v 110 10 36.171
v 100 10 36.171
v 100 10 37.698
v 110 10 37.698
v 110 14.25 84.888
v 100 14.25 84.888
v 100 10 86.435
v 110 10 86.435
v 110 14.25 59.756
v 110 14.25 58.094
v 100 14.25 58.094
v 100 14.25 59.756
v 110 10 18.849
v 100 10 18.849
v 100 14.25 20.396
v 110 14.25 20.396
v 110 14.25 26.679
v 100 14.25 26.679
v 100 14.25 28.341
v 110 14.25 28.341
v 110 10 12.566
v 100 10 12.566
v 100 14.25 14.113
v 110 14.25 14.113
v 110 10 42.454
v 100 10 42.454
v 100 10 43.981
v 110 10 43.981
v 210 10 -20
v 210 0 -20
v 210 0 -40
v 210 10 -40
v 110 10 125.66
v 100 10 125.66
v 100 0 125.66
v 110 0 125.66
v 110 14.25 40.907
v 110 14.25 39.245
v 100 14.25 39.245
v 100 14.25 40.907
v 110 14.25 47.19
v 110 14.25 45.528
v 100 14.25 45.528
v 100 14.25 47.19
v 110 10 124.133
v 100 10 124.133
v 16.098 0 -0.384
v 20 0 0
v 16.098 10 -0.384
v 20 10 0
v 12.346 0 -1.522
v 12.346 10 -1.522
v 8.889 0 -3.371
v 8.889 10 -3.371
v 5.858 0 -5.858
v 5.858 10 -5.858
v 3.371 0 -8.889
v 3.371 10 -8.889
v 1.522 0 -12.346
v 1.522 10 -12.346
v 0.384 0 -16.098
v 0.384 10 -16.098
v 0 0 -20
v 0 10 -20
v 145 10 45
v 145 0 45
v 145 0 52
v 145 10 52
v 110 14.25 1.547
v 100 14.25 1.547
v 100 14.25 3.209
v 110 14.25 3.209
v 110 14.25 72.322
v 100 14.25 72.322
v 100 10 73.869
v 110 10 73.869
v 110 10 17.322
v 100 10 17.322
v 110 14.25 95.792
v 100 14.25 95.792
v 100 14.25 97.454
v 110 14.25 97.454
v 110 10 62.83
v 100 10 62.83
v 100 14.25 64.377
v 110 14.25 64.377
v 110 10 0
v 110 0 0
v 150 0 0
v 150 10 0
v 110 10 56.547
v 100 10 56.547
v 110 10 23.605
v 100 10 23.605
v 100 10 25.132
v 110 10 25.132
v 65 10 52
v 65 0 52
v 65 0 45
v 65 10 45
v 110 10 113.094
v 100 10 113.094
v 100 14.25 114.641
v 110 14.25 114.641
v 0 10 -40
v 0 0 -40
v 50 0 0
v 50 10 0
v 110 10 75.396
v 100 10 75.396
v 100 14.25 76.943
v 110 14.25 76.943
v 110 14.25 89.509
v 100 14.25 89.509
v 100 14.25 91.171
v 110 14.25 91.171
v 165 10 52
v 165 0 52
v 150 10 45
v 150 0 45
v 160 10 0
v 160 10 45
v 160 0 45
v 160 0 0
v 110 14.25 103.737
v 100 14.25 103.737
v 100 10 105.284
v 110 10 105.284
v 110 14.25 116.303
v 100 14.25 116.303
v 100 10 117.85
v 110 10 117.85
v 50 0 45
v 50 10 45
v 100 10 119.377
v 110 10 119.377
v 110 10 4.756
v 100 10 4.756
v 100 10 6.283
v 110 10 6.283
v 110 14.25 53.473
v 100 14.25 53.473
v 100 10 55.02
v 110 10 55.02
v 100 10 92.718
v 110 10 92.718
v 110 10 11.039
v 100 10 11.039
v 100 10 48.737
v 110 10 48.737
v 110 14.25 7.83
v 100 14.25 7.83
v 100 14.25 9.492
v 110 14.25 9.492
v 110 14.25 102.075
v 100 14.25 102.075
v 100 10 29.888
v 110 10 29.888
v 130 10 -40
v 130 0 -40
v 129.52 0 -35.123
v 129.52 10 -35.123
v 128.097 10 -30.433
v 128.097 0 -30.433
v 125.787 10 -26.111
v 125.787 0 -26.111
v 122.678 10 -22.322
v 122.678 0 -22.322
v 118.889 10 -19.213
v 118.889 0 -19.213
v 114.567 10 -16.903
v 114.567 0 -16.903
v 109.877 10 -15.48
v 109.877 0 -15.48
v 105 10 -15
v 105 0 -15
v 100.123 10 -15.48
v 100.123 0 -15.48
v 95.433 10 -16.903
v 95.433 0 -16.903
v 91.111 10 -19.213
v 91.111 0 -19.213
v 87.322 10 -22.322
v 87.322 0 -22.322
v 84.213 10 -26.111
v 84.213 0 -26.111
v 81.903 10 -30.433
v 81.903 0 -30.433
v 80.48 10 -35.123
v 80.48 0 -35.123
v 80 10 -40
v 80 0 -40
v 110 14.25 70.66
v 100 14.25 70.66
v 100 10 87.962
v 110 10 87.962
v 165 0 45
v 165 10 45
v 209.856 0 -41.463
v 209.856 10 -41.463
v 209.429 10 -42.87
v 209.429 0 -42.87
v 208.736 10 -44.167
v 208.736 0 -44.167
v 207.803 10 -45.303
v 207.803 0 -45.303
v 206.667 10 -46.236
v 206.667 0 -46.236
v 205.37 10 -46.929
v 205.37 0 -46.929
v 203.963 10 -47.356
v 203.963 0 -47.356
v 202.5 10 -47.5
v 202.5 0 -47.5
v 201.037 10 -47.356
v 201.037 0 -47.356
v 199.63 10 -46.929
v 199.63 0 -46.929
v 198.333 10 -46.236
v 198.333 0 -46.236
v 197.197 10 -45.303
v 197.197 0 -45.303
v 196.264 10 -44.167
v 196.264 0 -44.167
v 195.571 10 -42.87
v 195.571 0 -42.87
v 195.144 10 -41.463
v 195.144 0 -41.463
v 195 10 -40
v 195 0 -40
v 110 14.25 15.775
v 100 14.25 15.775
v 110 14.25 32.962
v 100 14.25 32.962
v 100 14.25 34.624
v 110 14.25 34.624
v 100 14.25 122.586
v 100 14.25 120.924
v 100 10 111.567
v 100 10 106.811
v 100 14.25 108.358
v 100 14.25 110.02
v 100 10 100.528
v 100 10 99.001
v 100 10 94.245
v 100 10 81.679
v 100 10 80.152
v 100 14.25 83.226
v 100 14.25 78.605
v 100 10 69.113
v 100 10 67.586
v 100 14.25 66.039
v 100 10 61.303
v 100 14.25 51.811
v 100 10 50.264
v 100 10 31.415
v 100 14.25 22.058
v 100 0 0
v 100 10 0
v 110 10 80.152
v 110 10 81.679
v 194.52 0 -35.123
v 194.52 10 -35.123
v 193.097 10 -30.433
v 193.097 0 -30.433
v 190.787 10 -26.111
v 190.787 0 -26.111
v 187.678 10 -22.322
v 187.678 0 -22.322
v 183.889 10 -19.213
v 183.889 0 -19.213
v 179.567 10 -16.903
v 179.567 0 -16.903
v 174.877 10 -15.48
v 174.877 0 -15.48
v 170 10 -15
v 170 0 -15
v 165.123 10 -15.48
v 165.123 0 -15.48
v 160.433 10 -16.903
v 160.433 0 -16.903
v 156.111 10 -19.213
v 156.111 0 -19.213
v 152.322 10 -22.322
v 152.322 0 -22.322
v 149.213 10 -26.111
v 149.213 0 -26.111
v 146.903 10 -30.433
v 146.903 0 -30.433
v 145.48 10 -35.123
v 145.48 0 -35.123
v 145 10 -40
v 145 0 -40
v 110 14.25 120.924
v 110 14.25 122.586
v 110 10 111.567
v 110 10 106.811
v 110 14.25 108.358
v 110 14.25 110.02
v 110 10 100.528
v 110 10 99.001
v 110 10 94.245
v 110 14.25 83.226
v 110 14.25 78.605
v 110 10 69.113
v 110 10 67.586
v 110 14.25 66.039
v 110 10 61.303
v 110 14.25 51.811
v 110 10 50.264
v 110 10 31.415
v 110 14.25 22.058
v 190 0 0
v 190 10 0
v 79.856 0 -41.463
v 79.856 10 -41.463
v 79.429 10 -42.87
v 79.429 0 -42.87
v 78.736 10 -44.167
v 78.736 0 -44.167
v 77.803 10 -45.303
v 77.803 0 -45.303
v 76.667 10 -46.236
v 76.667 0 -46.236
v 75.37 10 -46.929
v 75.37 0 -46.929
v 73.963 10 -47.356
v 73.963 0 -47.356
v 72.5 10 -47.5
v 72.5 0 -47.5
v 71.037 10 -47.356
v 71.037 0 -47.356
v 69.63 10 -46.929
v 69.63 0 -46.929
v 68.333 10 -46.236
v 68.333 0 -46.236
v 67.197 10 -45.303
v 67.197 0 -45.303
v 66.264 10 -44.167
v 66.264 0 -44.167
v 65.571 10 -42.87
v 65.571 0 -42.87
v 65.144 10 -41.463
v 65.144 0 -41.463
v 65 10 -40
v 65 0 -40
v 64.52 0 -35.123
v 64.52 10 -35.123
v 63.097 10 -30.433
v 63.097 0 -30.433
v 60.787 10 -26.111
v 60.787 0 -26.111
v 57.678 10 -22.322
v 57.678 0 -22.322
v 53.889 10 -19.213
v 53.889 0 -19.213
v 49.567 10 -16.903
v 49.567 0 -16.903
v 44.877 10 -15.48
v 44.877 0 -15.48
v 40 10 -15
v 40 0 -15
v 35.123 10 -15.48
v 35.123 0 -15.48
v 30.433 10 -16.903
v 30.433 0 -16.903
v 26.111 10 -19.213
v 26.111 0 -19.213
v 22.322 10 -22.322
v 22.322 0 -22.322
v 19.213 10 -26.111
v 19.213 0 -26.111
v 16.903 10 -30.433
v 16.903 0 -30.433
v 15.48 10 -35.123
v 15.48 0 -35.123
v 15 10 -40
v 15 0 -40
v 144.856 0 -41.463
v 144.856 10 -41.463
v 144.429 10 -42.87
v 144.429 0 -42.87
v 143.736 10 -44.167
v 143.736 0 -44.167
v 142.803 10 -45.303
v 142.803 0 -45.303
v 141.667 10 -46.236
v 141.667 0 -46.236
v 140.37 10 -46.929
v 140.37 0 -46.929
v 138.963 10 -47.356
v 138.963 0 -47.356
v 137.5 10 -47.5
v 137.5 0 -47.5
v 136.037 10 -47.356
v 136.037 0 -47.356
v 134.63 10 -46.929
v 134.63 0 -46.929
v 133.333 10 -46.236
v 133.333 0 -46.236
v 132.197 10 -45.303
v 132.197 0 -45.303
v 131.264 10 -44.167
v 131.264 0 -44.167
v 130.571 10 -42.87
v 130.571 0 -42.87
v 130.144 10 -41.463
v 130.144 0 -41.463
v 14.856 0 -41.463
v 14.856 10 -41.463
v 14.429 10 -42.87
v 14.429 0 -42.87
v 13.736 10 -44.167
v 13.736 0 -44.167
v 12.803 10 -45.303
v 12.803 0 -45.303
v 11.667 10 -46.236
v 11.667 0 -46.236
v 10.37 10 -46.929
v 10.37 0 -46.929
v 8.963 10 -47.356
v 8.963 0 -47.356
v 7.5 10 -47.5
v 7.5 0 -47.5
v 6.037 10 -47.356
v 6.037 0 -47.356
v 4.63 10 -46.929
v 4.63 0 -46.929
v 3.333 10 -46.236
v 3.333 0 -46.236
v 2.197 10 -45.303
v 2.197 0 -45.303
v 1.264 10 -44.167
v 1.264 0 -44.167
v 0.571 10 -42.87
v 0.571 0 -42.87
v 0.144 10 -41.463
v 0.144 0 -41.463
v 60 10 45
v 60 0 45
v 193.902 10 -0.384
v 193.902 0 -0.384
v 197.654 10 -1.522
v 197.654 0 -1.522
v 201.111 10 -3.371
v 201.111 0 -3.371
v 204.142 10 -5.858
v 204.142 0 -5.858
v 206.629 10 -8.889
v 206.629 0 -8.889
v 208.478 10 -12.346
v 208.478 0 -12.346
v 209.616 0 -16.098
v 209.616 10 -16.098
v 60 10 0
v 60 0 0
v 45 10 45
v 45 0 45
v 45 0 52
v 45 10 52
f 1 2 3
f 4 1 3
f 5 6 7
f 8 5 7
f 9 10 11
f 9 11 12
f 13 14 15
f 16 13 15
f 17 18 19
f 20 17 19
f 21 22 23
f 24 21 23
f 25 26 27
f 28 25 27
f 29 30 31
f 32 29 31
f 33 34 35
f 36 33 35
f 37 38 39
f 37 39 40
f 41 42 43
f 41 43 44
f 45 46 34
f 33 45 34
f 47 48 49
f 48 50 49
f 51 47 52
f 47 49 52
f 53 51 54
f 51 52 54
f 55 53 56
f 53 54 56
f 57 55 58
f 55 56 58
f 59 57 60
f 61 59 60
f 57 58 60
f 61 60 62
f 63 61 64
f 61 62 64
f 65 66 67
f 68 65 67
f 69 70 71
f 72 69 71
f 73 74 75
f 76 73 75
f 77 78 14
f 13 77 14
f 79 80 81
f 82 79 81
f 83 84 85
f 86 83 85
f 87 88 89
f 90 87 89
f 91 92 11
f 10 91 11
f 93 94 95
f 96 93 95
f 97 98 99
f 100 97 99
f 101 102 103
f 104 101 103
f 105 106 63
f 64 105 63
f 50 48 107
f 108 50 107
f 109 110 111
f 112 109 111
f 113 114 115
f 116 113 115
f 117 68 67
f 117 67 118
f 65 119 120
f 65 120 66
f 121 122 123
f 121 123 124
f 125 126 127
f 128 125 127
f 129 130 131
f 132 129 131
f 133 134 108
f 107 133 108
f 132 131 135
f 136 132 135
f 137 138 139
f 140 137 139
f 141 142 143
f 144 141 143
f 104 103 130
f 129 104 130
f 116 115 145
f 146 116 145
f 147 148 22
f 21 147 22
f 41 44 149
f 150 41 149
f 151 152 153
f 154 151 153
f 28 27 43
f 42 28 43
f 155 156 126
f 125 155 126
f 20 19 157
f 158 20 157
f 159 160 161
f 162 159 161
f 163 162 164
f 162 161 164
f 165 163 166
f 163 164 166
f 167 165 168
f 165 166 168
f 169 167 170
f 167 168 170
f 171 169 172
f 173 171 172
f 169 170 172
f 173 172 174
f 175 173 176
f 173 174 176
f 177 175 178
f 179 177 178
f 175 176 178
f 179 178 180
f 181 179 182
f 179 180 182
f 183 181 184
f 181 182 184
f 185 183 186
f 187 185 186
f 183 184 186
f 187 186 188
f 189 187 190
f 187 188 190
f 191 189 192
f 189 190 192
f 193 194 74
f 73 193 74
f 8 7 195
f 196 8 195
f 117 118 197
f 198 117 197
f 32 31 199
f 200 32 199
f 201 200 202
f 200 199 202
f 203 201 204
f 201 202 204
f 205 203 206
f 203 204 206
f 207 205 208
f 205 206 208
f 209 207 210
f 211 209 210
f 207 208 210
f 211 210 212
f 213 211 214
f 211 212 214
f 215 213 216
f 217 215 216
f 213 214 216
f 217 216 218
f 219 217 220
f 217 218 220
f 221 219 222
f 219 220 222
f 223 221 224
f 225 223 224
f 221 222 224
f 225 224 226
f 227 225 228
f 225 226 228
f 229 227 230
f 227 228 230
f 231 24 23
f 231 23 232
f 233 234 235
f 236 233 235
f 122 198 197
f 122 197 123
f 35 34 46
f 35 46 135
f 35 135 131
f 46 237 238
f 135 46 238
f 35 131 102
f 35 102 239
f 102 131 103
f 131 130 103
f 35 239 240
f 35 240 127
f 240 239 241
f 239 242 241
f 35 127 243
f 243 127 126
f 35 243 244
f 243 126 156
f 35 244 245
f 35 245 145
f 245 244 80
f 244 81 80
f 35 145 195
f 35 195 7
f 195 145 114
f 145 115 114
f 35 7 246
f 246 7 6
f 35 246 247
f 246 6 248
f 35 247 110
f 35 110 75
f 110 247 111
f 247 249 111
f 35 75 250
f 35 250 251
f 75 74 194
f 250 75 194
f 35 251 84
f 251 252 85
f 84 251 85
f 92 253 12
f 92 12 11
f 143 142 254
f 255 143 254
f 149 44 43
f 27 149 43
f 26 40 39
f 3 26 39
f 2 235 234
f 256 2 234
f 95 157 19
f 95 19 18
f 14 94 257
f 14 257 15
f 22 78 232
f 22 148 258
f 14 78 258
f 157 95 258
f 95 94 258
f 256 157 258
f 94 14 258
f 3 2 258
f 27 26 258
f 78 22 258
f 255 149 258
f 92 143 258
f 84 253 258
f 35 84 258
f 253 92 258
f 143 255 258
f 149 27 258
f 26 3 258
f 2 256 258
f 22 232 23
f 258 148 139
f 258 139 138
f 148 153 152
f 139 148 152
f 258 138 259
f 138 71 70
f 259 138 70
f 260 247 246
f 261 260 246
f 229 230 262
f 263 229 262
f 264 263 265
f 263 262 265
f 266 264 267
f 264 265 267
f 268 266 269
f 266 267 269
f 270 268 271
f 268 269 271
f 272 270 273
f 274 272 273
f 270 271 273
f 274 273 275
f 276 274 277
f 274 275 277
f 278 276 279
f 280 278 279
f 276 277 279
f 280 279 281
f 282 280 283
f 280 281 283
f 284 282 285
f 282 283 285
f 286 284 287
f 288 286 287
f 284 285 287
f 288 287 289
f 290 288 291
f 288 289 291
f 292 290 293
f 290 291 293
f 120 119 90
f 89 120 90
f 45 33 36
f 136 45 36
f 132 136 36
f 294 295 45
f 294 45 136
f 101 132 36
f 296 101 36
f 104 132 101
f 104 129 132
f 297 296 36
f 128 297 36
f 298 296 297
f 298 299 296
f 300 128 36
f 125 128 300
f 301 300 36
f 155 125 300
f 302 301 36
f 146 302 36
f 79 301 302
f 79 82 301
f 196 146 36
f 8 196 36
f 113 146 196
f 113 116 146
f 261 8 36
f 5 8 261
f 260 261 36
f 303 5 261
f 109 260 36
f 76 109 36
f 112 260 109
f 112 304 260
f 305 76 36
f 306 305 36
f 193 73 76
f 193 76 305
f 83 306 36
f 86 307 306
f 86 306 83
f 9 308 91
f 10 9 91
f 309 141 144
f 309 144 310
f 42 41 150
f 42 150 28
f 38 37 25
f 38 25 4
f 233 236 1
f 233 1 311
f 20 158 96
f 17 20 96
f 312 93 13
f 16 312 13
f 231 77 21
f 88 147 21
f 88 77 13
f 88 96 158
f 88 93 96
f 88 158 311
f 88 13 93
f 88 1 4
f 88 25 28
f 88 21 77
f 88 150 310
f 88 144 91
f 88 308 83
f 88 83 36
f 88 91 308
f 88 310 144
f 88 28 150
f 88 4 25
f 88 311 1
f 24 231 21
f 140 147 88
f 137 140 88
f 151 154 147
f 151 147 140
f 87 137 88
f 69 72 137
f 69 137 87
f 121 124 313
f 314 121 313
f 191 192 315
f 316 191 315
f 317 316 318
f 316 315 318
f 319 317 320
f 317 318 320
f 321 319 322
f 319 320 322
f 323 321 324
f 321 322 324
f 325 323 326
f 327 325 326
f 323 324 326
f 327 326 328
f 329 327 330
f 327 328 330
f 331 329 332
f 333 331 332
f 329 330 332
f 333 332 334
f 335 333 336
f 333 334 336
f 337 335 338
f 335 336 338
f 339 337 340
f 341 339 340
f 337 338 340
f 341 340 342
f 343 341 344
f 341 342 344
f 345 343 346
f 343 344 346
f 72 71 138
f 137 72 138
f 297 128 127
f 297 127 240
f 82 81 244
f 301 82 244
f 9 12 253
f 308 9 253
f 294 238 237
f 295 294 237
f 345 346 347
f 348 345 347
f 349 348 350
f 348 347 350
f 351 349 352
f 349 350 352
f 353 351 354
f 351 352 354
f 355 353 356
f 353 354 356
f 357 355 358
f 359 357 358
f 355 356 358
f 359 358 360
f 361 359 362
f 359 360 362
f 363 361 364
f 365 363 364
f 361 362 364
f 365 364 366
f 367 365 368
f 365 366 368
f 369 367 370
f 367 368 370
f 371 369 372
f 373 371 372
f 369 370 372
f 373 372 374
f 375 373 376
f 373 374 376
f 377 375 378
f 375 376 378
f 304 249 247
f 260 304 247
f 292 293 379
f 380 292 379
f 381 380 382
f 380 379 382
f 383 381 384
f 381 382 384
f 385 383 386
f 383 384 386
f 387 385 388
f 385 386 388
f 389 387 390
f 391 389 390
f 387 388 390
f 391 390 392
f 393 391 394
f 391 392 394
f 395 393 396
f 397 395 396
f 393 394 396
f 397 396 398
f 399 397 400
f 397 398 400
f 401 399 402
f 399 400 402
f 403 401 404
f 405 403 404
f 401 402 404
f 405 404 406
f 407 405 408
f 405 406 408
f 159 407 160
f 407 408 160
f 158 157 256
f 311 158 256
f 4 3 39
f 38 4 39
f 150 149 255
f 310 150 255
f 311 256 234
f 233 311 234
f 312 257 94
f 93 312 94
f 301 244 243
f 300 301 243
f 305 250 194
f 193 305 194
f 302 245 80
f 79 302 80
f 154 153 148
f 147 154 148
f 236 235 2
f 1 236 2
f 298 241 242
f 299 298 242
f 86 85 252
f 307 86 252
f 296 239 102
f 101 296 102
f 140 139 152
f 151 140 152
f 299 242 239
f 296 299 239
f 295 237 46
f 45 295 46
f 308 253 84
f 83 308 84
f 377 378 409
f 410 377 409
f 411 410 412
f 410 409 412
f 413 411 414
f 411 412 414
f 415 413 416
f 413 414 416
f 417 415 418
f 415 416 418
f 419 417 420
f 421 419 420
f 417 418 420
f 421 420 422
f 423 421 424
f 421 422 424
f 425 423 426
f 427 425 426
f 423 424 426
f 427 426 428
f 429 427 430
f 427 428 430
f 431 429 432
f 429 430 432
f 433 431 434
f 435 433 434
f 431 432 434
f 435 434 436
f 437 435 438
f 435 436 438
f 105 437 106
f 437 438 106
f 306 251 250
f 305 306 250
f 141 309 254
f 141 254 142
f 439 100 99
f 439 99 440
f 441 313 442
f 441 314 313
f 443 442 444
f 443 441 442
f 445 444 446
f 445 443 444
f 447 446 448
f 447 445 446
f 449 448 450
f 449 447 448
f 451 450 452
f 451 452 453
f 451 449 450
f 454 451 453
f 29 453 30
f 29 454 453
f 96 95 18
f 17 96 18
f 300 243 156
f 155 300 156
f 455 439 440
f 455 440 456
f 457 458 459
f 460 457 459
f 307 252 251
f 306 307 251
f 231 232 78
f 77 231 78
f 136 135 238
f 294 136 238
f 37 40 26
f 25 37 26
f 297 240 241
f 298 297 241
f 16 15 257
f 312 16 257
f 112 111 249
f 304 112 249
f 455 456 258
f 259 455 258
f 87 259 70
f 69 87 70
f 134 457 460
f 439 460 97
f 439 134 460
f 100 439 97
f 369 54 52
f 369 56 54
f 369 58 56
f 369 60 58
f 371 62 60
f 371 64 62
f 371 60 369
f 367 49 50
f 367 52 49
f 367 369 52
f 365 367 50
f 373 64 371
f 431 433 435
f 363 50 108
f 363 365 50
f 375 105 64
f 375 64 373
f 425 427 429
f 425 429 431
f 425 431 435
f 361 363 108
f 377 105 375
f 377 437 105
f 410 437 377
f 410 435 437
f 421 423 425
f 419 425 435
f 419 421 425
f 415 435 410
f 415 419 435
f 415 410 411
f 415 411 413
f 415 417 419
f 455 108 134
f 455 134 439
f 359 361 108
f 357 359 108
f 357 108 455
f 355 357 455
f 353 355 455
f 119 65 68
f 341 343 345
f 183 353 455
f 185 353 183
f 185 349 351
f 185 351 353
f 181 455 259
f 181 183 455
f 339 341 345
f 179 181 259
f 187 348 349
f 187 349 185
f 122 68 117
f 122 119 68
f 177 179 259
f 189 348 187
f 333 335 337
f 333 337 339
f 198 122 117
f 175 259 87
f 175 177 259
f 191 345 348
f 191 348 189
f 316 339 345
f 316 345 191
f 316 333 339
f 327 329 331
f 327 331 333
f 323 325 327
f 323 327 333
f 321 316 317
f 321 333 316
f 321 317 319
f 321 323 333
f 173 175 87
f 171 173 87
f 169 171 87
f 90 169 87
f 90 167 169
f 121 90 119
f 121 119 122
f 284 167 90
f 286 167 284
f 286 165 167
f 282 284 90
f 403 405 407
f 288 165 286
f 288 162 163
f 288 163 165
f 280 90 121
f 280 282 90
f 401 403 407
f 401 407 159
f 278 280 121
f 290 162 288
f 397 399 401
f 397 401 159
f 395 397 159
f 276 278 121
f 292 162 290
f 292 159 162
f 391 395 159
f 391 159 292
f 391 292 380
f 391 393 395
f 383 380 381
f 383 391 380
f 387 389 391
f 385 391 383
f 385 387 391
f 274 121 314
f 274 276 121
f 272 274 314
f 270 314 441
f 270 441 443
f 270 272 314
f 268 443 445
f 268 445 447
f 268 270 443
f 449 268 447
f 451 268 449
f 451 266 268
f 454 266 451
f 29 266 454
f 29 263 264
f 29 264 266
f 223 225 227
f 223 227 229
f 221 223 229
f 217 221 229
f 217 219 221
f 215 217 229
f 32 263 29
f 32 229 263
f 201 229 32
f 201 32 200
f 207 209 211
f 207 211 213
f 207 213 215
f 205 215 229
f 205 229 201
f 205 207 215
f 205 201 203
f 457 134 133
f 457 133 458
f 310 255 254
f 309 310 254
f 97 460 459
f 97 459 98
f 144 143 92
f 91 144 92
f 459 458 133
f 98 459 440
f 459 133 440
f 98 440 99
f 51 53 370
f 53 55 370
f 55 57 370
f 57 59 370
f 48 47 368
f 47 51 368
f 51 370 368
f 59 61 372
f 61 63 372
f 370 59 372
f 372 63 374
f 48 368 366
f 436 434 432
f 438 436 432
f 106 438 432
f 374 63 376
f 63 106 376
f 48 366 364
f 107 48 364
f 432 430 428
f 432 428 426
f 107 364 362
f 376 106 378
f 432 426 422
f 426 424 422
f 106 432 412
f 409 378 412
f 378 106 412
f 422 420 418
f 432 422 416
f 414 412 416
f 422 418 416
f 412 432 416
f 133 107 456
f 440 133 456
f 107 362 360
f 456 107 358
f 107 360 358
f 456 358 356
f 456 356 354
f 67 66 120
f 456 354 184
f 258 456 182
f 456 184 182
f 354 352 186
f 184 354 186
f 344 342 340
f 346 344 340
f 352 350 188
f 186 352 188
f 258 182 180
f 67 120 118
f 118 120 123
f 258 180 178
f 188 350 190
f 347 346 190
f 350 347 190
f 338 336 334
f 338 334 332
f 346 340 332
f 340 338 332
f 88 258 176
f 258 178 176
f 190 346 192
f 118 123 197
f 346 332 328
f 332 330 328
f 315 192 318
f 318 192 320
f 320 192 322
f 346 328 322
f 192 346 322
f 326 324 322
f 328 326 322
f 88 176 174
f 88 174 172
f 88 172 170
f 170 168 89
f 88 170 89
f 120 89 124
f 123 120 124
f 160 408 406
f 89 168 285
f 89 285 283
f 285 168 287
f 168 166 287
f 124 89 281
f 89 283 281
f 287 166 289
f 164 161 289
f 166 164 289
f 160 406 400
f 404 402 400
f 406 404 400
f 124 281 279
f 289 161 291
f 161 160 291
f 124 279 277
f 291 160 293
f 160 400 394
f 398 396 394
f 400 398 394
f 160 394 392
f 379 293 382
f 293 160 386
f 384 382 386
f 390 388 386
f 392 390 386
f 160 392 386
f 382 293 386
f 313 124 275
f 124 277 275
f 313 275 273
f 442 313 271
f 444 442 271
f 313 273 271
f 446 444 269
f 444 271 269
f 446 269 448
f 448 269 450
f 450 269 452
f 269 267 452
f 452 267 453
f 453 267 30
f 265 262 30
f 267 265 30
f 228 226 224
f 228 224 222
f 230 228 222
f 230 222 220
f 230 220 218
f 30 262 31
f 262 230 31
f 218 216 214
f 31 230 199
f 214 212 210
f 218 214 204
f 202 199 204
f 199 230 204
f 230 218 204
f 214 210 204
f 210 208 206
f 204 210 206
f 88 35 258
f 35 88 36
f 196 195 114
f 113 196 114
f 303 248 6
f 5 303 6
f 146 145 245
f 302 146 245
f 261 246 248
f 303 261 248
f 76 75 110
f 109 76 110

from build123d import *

# Parameters (mm, degrees)
BOSS_EXTRU_1_DEPTH = 10
ESQUISSE2_W        = 10
ESQUISSE2_H        = 45
BOSS_EXTRU_2_DEPTH = 10
CONG_1_R           = 20
BOSS_EXTRU_3_DEPTH = 10


with BuildPart() as part:
    # Esquisse1 → Boss.-Extru.1 (new body)
    with BuildSketch(Plane(origin=(0, 0, 0), x_dir=(1, 0, 0), z_dir=(0, 1, 0))):
        with BuildLine():
            Line((0, 0), (210, 0))
            Line((210, 0), (210, 40))
            ThreePointArc((210, 40), (202.5, 47.5), (195, 40))
            ThreePointArc((195, 40), (170, 15), (145, 40))
            ThreePointArc((145, 40), (137.5, 47.5), (130, 40))
            ThreePointArc((130, 40), (105, 15), (80, 40))
            ThreePointArc((80, 40), (72.5, 47.5), (65, 40))
            ThreePointArc((65, 40), (40, 15), (15, 40))
            ThreePointArc((15, 40), (7.5, 47.5), (0, 40))
            Line((0, 40), (0, 0))
        make_face()
    extrude(amount=BOSS_EXTRU_1_DEPTH)

    # Esquisse2 → Boss.-Extru.2 (add)
    with BuildSketch(Plane(origin=(0, 10, 0), x_dir=(1, 0, 0), z_dir=(0, 1, 0))):
        Polygon((60, -45), (50, -45), (45, -45), (45, -52), (65, -52), (65, -45), align=None)
        with Locations((55, -22.5)):
            Rectangle(ESQUISSE2_W, ESQUISSE2_H)
        with Locations((105, -22.5)):
            Rectangle(ESQUISSE2_W, ESQUISSE2_H)
        with Locations((155, -22.5)):
            Rectangle(ESQUISSE2_W, ESQUISSE2_H)
        Polygon((160, -45), (150, -45), (145, -45), (145, -52), (165, -52), (165, -45), align=None)
    extrude(amount=-BOSS_EXTRU_2_DEPTH)

    # Congé1
    cong_1_edges = [part.edges().sort_by_distance(p)[0] for p in [
        (210, 5, 0),
        (0, 5, 0),
    ]]
    fillet(cong_1_edges, radius=CONG_1_R)

    # Esquisse3 → Boss.-Extru.3 (add)
    with BuildSketch(Plane.ZY.offset(-100)):
        Polygon((3.209033432, 14.25), (4.755906928, 10), (6.283, 10), (7.829873496, 14.25), (9.492033432, 14.25), (11.038906928, 10), (12.566, 10), (14.112873496, 14.25), (15.775033432, 14.25), (17.321906928, 10), (18.849, 10), (20.395873496, 14.25), (22.058033432, 14.25), (23.604906928, 10), (25.132, 10), (26.678873496, 14.25), (28.341033432, 14.25), (29.887906928, 10), (31.415, 10), (32.961873496, 14.25), (34.624033432, 14.25), (36.170906928, 10), (37.698, 10), (39.244873496, 14.25), (40.907033432, 14.25), (42.453906928, 10), (43.981, 10), (45.527873496, 14.25), (47.190033432, 14.25), (48.736906928, 10), (50.264, 10), (51.810873496, 14.25), (53.473033432, 14.25), (55.019906928, 10), (56.547, 10), (58.093873496, 14.25), (59.756033432, 14.25), (61.302906928, 10), (62.83, 10), (64.376873496, 14.25), (66.039033432, 14.25), (67.585906928, 10), (69.113, 10), (70.659873496, 14.25), (72.322033432, 14.25), (73.868906928, 10), (75.396, 10), (76.942873496, 14.25), (78.605033432, 14.25), (80.151906928, 10), (81.679, 10), (83.225873496, 14.25), (84.888033432, 14.25), (86.434906928, 10), (87.962, 10), (89.508873496, 14.25), (91.171033432, 14.25), (92.717906928, 10), (94.245, 10), (95.791873496, 14.25), (97.454033432, 14.25), (99.000906928, 10), (100.528, 10), (102.074873496, 14.25), (103.737033432, 14.25), (105.283906928, 10), (106.811, 10), (108.357873496, 14.25), (110.020033432, 14.25), (111.566906928, 10), (113.094, 10), (114.640873496, 14.25), (116.303033432, 14.25), (117.849906928, 10), (119.377, 10), (120.923873496, 14.25), (122.586033432, 14.25), (124.132906928, 10), (125.66, 10), (125.66, 0), (0, 0), (0, 10), (1.546873496, 14.25), align=None)
    extrude(amount=-BOSS_EXTRU_3_DEPTH)


solid = part.part
